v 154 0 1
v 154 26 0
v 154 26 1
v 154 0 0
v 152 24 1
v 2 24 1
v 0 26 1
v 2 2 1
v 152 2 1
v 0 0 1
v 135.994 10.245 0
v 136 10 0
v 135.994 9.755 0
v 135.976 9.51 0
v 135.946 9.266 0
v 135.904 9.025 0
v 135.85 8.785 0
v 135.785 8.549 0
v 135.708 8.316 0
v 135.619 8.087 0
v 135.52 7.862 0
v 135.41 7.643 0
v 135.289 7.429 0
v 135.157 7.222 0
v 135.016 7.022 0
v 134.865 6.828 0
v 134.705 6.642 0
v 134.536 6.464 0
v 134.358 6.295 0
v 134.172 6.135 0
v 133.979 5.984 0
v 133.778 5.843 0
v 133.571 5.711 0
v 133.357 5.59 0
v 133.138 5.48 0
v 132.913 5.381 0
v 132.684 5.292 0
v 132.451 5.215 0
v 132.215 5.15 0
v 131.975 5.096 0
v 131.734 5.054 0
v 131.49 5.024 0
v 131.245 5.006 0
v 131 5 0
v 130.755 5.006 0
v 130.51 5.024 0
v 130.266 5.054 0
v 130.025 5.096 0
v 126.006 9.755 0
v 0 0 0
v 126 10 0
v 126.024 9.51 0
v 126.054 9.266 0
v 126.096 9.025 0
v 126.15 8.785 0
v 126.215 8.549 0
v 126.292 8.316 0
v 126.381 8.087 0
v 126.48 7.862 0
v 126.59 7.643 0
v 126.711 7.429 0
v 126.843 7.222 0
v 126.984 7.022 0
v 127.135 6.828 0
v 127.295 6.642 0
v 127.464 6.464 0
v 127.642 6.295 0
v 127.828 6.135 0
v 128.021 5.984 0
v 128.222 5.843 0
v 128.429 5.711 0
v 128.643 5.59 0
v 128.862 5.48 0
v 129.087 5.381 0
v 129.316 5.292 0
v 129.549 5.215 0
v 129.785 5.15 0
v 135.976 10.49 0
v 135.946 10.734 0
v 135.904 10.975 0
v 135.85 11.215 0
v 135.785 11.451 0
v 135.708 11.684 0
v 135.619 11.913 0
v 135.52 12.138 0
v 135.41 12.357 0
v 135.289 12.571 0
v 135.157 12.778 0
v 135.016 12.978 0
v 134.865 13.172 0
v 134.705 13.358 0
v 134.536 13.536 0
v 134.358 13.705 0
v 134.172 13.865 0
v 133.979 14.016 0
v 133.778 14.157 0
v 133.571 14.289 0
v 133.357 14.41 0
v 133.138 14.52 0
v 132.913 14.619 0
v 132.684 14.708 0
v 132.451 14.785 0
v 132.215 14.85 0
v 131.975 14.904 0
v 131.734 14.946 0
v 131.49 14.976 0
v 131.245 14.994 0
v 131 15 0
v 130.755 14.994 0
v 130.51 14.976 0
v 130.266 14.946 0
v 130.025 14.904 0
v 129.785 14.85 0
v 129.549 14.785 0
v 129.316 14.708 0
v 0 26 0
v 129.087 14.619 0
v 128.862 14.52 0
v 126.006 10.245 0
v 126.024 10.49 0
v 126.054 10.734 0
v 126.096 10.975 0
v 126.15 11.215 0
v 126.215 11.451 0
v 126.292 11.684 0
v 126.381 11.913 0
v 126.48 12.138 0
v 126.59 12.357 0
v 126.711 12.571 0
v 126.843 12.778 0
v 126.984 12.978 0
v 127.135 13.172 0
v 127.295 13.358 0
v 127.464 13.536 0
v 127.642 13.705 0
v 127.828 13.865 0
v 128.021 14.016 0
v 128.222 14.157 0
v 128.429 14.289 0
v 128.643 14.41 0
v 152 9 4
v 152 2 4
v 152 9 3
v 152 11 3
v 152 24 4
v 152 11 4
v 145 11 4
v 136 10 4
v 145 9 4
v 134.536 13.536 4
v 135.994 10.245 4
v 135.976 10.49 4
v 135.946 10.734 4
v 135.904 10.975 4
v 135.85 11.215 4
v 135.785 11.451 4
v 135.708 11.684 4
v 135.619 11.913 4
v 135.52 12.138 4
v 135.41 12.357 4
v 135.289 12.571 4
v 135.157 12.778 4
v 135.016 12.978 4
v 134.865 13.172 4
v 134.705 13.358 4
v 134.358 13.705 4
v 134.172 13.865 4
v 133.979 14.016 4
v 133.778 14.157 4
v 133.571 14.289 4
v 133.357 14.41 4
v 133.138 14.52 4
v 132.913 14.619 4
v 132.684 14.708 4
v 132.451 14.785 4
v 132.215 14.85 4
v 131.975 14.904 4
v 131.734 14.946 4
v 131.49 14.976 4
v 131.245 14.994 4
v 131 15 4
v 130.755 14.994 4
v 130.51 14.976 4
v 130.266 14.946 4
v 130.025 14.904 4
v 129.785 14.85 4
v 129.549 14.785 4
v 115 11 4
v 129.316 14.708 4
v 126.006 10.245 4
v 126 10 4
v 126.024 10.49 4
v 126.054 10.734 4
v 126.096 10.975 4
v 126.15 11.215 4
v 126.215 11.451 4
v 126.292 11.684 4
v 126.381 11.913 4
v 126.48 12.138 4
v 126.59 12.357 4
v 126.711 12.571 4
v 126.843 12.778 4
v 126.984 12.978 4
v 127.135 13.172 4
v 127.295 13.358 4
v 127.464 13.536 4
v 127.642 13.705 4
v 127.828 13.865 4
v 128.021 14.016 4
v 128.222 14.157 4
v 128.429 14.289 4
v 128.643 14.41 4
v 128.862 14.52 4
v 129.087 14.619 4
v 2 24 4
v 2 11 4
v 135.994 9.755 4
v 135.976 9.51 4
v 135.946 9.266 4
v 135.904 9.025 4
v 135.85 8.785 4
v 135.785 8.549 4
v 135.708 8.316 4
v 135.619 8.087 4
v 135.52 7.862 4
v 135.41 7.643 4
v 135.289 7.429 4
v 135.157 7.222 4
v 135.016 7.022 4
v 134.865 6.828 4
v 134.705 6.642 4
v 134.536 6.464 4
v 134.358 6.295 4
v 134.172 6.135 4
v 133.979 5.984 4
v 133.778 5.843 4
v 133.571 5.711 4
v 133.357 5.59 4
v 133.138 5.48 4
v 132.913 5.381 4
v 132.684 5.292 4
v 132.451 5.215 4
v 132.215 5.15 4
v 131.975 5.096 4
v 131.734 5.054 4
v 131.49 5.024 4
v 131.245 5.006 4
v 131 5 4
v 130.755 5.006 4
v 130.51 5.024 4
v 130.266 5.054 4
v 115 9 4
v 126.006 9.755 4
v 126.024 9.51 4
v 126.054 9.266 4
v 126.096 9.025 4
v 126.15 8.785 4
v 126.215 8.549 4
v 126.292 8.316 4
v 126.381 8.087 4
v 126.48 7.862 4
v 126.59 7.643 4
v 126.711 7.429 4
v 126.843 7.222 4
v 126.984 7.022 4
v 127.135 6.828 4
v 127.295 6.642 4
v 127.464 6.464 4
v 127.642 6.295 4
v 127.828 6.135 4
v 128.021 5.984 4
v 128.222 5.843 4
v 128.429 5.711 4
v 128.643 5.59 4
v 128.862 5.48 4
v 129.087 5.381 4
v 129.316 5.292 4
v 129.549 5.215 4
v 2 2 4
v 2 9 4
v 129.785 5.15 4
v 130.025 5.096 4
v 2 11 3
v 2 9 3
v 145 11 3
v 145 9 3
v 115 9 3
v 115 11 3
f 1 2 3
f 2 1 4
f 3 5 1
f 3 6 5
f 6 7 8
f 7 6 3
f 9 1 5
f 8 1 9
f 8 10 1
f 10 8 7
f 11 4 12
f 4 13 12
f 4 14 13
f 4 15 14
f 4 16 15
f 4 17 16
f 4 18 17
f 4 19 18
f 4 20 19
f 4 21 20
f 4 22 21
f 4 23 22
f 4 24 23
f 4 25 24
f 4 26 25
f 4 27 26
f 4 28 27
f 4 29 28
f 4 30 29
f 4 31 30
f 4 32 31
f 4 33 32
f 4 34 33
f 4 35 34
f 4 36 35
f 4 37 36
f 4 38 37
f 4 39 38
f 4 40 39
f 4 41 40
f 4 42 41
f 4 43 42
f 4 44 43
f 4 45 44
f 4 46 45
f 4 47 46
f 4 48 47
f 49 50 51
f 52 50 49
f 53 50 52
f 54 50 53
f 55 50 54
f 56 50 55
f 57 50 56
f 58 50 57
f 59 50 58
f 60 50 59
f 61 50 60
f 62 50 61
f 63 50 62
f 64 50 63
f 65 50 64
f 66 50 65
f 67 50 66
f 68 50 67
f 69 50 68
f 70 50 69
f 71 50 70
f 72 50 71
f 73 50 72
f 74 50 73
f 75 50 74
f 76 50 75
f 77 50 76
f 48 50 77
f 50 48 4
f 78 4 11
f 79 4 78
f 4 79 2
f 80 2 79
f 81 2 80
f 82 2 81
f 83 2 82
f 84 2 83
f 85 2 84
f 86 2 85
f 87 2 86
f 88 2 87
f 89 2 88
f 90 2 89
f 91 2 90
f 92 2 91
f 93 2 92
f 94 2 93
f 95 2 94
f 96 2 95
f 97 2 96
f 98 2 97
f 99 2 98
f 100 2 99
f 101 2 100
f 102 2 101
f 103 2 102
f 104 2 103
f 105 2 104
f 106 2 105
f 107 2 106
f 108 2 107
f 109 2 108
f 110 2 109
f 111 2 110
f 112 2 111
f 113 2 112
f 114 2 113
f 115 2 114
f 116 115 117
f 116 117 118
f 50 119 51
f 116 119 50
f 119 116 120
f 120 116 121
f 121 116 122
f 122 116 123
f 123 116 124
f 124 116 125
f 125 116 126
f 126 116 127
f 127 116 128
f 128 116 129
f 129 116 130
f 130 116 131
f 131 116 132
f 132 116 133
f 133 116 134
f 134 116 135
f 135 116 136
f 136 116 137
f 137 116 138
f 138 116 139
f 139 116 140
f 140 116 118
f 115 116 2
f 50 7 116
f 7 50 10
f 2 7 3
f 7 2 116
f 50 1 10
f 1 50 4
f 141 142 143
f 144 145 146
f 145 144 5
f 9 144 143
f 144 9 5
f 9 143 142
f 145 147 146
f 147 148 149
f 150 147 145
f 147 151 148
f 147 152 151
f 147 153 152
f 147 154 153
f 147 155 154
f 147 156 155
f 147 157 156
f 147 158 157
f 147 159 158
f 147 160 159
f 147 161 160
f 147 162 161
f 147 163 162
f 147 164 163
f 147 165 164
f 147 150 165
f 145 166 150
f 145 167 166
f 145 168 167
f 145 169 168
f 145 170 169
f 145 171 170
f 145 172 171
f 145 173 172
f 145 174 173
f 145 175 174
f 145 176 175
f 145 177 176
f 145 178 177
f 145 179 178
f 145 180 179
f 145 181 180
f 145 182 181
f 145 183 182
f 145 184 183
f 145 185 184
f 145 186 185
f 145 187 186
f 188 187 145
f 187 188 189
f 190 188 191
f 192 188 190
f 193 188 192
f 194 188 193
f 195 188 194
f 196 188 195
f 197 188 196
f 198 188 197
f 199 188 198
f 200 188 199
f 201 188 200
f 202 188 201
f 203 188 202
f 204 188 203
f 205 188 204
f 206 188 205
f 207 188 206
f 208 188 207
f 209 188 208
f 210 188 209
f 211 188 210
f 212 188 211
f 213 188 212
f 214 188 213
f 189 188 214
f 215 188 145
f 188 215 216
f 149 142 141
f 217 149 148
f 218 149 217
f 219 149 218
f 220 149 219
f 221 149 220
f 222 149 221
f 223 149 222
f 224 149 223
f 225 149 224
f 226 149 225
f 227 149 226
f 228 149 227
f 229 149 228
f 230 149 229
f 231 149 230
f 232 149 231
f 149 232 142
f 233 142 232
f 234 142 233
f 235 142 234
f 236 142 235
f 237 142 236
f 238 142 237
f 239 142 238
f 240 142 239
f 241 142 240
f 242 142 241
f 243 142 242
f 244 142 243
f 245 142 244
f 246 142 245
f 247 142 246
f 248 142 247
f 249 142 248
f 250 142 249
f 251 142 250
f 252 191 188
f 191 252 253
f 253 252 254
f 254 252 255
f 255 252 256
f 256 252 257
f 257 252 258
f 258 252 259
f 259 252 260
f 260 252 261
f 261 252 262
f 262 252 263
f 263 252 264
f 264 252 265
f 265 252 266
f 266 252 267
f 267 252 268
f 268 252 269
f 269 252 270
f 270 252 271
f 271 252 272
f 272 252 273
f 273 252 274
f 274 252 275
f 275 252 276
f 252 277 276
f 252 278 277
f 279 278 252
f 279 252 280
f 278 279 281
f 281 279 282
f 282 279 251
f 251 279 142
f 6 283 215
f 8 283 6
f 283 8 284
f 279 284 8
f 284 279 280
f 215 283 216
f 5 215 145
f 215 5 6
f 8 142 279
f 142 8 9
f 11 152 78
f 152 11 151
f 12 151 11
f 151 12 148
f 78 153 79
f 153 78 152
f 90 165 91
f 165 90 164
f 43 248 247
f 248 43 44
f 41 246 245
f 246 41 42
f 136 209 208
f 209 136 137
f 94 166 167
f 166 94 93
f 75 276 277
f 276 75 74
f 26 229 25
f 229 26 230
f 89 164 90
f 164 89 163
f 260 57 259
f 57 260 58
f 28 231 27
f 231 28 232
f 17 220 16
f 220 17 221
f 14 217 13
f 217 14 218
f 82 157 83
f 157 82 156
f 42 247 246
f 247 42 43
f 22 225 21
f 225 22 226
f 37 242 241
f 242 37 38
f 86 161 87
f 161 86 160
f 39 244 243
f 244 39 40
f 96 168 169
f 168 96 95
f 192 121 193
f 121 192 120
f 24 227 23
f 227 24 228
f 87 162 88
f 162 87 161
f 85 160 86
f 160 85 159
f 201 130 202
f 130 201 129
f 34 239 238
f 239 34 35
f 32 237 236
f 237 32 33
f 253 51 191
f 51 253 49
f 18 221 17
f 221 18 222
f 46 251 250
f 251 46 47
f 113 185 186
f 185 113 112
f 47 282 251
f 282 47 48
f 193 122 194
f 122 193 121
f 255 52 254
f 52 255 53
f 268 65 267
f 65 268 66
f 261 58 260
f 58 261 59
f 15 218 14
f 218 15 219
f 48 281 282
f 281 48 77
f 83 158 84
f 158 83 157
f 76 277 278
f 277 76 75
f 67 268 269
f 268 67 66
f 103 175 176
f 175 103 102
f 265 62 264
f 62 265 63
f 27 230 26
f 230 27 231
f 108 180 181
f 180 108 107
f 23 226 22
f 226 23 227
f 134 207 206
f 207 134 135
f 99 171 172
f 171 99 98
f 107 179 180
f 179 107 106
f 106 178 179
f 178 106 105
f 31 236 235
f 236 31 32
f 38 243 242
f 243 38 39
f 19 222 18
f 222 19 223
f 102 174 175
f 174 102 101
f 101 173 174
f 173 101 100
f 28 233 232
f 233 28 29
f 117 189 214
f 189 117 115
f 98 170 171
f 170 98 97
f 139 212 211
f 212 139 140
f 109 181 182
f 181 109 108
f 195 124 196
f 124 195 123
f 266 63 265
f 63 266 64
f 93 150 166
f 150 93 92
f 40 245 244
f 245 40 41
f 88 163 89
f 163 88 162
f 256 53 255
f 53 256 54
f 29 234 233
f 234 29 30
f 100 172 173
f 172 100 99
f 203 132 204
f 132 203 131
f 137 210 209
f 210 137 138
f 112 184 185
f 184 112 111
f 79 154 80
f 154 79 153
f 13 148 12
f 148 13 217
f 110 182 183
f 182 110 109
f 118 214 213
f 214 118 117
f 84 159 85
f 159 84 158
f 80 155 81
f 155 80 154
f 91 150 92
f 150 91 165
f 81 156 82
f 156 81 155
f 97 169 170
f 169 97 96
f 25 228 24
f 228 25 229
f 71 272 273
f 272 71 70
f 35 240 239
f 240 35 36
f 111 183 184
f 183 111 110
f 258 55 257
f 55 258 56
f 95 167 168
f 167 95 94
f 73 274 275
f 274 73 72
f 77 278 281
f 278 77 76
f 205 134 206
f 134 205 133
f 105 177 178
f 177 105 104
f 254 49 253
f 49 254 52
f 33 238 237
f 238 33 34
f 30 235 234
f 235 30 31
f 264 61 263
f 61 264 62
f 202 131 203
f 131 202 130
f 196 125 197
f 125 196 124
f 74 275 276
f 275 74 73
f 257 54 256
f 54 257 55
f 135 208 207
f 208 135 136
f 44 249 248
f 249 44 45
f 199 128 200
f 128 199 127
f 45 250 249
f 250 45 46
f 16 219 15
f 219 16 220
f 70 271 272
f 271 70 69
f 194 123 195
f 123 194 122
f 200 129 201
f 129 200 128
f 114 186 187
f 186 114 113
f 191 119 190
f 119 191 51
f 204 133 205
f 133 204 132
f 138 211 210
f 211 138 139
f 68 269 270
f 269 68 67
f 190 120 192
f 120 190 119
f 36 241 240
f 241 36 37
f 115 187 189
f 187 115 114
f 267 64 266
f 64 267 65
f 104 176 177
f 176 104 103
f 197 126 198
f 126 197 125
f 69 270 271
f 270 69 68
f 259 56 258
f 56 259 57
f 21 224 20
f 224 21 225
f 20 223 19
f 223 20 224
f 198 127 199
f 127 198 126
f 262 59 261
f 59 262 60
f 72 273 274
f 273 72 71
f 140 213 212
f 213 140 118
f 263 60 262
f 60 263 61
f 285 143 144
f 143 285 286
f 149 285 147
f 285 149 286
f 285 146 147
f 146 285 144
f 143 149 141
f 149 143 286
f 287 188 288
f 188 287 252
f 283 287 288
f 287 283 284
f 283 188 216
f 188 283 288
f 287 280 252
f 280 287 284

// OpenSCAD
// ПК8010 Корвет small right-side lid. All dimensions are in millimetres.
// Print with the broad base on the bed.

base_length = 154;
base_width = 26;
base_thickness = 1;
upper_length = 150;
upper_width = 22;
upper_height = 3;
button_hole_diameter = 10;
button_hole_from_right = 23;
button_hole_from_bottom = 10;
groove_from_bottom = 10;
groove_width = 2;
groove_depth = 1;
right_groove_length = 7;
left_groove_length = 113;

upper_left = (base_length - upper_length) / 2;
upper_right = (base_length + upper_length) / 2;
epsilon = 0.01;
$fn = 128;

assert(base_length >= upper_length && base_width >= upper_width);
assert(upper_length > 0 && upper_width > 0);
assert(base_thickness > 0 && upper_height > 0);
assert(groove_depth > 0 && groove_depth < upper_height);

difference() {
    union() {
        cube([base_length, base_width, base_thickness]);
        translate([
            (base_length - upper_length) / 2,
            (base_width - upper_width) / 2,
            base_thickness
        ])
            cube([upper_length, upper_width, upper_height]);
    }
    // Offsets are measured from the outer base edges in top view.
    translate([base_length - button_hole_from_right,
               button_hole_from_bottom, -epsilon])
        cylinder(d = button_hole_diameter,
                 h = base_thickness + upper_height + 2 * epsilon);

    // Short groove opens at the raised section's right edge.
    translate([upper_right - right_groove_length,
               groove_from_bottom - groove_width / 2,
               base_thickness + upper_height - groove_depth])
        cube([right_groove_length + epsilon, groove_width,
              groove_depth + epsilon]);

    // Long groove opens at the raised section's left edge.
    translate([upper_left - epsilon,
               groove_from_bottom - groove_width / 2,
               base_thickness + upper_height - groove_depth])
        cube([left_groove_length + epsilon,
              groove_width, groove_depth + epsilon]);
}
